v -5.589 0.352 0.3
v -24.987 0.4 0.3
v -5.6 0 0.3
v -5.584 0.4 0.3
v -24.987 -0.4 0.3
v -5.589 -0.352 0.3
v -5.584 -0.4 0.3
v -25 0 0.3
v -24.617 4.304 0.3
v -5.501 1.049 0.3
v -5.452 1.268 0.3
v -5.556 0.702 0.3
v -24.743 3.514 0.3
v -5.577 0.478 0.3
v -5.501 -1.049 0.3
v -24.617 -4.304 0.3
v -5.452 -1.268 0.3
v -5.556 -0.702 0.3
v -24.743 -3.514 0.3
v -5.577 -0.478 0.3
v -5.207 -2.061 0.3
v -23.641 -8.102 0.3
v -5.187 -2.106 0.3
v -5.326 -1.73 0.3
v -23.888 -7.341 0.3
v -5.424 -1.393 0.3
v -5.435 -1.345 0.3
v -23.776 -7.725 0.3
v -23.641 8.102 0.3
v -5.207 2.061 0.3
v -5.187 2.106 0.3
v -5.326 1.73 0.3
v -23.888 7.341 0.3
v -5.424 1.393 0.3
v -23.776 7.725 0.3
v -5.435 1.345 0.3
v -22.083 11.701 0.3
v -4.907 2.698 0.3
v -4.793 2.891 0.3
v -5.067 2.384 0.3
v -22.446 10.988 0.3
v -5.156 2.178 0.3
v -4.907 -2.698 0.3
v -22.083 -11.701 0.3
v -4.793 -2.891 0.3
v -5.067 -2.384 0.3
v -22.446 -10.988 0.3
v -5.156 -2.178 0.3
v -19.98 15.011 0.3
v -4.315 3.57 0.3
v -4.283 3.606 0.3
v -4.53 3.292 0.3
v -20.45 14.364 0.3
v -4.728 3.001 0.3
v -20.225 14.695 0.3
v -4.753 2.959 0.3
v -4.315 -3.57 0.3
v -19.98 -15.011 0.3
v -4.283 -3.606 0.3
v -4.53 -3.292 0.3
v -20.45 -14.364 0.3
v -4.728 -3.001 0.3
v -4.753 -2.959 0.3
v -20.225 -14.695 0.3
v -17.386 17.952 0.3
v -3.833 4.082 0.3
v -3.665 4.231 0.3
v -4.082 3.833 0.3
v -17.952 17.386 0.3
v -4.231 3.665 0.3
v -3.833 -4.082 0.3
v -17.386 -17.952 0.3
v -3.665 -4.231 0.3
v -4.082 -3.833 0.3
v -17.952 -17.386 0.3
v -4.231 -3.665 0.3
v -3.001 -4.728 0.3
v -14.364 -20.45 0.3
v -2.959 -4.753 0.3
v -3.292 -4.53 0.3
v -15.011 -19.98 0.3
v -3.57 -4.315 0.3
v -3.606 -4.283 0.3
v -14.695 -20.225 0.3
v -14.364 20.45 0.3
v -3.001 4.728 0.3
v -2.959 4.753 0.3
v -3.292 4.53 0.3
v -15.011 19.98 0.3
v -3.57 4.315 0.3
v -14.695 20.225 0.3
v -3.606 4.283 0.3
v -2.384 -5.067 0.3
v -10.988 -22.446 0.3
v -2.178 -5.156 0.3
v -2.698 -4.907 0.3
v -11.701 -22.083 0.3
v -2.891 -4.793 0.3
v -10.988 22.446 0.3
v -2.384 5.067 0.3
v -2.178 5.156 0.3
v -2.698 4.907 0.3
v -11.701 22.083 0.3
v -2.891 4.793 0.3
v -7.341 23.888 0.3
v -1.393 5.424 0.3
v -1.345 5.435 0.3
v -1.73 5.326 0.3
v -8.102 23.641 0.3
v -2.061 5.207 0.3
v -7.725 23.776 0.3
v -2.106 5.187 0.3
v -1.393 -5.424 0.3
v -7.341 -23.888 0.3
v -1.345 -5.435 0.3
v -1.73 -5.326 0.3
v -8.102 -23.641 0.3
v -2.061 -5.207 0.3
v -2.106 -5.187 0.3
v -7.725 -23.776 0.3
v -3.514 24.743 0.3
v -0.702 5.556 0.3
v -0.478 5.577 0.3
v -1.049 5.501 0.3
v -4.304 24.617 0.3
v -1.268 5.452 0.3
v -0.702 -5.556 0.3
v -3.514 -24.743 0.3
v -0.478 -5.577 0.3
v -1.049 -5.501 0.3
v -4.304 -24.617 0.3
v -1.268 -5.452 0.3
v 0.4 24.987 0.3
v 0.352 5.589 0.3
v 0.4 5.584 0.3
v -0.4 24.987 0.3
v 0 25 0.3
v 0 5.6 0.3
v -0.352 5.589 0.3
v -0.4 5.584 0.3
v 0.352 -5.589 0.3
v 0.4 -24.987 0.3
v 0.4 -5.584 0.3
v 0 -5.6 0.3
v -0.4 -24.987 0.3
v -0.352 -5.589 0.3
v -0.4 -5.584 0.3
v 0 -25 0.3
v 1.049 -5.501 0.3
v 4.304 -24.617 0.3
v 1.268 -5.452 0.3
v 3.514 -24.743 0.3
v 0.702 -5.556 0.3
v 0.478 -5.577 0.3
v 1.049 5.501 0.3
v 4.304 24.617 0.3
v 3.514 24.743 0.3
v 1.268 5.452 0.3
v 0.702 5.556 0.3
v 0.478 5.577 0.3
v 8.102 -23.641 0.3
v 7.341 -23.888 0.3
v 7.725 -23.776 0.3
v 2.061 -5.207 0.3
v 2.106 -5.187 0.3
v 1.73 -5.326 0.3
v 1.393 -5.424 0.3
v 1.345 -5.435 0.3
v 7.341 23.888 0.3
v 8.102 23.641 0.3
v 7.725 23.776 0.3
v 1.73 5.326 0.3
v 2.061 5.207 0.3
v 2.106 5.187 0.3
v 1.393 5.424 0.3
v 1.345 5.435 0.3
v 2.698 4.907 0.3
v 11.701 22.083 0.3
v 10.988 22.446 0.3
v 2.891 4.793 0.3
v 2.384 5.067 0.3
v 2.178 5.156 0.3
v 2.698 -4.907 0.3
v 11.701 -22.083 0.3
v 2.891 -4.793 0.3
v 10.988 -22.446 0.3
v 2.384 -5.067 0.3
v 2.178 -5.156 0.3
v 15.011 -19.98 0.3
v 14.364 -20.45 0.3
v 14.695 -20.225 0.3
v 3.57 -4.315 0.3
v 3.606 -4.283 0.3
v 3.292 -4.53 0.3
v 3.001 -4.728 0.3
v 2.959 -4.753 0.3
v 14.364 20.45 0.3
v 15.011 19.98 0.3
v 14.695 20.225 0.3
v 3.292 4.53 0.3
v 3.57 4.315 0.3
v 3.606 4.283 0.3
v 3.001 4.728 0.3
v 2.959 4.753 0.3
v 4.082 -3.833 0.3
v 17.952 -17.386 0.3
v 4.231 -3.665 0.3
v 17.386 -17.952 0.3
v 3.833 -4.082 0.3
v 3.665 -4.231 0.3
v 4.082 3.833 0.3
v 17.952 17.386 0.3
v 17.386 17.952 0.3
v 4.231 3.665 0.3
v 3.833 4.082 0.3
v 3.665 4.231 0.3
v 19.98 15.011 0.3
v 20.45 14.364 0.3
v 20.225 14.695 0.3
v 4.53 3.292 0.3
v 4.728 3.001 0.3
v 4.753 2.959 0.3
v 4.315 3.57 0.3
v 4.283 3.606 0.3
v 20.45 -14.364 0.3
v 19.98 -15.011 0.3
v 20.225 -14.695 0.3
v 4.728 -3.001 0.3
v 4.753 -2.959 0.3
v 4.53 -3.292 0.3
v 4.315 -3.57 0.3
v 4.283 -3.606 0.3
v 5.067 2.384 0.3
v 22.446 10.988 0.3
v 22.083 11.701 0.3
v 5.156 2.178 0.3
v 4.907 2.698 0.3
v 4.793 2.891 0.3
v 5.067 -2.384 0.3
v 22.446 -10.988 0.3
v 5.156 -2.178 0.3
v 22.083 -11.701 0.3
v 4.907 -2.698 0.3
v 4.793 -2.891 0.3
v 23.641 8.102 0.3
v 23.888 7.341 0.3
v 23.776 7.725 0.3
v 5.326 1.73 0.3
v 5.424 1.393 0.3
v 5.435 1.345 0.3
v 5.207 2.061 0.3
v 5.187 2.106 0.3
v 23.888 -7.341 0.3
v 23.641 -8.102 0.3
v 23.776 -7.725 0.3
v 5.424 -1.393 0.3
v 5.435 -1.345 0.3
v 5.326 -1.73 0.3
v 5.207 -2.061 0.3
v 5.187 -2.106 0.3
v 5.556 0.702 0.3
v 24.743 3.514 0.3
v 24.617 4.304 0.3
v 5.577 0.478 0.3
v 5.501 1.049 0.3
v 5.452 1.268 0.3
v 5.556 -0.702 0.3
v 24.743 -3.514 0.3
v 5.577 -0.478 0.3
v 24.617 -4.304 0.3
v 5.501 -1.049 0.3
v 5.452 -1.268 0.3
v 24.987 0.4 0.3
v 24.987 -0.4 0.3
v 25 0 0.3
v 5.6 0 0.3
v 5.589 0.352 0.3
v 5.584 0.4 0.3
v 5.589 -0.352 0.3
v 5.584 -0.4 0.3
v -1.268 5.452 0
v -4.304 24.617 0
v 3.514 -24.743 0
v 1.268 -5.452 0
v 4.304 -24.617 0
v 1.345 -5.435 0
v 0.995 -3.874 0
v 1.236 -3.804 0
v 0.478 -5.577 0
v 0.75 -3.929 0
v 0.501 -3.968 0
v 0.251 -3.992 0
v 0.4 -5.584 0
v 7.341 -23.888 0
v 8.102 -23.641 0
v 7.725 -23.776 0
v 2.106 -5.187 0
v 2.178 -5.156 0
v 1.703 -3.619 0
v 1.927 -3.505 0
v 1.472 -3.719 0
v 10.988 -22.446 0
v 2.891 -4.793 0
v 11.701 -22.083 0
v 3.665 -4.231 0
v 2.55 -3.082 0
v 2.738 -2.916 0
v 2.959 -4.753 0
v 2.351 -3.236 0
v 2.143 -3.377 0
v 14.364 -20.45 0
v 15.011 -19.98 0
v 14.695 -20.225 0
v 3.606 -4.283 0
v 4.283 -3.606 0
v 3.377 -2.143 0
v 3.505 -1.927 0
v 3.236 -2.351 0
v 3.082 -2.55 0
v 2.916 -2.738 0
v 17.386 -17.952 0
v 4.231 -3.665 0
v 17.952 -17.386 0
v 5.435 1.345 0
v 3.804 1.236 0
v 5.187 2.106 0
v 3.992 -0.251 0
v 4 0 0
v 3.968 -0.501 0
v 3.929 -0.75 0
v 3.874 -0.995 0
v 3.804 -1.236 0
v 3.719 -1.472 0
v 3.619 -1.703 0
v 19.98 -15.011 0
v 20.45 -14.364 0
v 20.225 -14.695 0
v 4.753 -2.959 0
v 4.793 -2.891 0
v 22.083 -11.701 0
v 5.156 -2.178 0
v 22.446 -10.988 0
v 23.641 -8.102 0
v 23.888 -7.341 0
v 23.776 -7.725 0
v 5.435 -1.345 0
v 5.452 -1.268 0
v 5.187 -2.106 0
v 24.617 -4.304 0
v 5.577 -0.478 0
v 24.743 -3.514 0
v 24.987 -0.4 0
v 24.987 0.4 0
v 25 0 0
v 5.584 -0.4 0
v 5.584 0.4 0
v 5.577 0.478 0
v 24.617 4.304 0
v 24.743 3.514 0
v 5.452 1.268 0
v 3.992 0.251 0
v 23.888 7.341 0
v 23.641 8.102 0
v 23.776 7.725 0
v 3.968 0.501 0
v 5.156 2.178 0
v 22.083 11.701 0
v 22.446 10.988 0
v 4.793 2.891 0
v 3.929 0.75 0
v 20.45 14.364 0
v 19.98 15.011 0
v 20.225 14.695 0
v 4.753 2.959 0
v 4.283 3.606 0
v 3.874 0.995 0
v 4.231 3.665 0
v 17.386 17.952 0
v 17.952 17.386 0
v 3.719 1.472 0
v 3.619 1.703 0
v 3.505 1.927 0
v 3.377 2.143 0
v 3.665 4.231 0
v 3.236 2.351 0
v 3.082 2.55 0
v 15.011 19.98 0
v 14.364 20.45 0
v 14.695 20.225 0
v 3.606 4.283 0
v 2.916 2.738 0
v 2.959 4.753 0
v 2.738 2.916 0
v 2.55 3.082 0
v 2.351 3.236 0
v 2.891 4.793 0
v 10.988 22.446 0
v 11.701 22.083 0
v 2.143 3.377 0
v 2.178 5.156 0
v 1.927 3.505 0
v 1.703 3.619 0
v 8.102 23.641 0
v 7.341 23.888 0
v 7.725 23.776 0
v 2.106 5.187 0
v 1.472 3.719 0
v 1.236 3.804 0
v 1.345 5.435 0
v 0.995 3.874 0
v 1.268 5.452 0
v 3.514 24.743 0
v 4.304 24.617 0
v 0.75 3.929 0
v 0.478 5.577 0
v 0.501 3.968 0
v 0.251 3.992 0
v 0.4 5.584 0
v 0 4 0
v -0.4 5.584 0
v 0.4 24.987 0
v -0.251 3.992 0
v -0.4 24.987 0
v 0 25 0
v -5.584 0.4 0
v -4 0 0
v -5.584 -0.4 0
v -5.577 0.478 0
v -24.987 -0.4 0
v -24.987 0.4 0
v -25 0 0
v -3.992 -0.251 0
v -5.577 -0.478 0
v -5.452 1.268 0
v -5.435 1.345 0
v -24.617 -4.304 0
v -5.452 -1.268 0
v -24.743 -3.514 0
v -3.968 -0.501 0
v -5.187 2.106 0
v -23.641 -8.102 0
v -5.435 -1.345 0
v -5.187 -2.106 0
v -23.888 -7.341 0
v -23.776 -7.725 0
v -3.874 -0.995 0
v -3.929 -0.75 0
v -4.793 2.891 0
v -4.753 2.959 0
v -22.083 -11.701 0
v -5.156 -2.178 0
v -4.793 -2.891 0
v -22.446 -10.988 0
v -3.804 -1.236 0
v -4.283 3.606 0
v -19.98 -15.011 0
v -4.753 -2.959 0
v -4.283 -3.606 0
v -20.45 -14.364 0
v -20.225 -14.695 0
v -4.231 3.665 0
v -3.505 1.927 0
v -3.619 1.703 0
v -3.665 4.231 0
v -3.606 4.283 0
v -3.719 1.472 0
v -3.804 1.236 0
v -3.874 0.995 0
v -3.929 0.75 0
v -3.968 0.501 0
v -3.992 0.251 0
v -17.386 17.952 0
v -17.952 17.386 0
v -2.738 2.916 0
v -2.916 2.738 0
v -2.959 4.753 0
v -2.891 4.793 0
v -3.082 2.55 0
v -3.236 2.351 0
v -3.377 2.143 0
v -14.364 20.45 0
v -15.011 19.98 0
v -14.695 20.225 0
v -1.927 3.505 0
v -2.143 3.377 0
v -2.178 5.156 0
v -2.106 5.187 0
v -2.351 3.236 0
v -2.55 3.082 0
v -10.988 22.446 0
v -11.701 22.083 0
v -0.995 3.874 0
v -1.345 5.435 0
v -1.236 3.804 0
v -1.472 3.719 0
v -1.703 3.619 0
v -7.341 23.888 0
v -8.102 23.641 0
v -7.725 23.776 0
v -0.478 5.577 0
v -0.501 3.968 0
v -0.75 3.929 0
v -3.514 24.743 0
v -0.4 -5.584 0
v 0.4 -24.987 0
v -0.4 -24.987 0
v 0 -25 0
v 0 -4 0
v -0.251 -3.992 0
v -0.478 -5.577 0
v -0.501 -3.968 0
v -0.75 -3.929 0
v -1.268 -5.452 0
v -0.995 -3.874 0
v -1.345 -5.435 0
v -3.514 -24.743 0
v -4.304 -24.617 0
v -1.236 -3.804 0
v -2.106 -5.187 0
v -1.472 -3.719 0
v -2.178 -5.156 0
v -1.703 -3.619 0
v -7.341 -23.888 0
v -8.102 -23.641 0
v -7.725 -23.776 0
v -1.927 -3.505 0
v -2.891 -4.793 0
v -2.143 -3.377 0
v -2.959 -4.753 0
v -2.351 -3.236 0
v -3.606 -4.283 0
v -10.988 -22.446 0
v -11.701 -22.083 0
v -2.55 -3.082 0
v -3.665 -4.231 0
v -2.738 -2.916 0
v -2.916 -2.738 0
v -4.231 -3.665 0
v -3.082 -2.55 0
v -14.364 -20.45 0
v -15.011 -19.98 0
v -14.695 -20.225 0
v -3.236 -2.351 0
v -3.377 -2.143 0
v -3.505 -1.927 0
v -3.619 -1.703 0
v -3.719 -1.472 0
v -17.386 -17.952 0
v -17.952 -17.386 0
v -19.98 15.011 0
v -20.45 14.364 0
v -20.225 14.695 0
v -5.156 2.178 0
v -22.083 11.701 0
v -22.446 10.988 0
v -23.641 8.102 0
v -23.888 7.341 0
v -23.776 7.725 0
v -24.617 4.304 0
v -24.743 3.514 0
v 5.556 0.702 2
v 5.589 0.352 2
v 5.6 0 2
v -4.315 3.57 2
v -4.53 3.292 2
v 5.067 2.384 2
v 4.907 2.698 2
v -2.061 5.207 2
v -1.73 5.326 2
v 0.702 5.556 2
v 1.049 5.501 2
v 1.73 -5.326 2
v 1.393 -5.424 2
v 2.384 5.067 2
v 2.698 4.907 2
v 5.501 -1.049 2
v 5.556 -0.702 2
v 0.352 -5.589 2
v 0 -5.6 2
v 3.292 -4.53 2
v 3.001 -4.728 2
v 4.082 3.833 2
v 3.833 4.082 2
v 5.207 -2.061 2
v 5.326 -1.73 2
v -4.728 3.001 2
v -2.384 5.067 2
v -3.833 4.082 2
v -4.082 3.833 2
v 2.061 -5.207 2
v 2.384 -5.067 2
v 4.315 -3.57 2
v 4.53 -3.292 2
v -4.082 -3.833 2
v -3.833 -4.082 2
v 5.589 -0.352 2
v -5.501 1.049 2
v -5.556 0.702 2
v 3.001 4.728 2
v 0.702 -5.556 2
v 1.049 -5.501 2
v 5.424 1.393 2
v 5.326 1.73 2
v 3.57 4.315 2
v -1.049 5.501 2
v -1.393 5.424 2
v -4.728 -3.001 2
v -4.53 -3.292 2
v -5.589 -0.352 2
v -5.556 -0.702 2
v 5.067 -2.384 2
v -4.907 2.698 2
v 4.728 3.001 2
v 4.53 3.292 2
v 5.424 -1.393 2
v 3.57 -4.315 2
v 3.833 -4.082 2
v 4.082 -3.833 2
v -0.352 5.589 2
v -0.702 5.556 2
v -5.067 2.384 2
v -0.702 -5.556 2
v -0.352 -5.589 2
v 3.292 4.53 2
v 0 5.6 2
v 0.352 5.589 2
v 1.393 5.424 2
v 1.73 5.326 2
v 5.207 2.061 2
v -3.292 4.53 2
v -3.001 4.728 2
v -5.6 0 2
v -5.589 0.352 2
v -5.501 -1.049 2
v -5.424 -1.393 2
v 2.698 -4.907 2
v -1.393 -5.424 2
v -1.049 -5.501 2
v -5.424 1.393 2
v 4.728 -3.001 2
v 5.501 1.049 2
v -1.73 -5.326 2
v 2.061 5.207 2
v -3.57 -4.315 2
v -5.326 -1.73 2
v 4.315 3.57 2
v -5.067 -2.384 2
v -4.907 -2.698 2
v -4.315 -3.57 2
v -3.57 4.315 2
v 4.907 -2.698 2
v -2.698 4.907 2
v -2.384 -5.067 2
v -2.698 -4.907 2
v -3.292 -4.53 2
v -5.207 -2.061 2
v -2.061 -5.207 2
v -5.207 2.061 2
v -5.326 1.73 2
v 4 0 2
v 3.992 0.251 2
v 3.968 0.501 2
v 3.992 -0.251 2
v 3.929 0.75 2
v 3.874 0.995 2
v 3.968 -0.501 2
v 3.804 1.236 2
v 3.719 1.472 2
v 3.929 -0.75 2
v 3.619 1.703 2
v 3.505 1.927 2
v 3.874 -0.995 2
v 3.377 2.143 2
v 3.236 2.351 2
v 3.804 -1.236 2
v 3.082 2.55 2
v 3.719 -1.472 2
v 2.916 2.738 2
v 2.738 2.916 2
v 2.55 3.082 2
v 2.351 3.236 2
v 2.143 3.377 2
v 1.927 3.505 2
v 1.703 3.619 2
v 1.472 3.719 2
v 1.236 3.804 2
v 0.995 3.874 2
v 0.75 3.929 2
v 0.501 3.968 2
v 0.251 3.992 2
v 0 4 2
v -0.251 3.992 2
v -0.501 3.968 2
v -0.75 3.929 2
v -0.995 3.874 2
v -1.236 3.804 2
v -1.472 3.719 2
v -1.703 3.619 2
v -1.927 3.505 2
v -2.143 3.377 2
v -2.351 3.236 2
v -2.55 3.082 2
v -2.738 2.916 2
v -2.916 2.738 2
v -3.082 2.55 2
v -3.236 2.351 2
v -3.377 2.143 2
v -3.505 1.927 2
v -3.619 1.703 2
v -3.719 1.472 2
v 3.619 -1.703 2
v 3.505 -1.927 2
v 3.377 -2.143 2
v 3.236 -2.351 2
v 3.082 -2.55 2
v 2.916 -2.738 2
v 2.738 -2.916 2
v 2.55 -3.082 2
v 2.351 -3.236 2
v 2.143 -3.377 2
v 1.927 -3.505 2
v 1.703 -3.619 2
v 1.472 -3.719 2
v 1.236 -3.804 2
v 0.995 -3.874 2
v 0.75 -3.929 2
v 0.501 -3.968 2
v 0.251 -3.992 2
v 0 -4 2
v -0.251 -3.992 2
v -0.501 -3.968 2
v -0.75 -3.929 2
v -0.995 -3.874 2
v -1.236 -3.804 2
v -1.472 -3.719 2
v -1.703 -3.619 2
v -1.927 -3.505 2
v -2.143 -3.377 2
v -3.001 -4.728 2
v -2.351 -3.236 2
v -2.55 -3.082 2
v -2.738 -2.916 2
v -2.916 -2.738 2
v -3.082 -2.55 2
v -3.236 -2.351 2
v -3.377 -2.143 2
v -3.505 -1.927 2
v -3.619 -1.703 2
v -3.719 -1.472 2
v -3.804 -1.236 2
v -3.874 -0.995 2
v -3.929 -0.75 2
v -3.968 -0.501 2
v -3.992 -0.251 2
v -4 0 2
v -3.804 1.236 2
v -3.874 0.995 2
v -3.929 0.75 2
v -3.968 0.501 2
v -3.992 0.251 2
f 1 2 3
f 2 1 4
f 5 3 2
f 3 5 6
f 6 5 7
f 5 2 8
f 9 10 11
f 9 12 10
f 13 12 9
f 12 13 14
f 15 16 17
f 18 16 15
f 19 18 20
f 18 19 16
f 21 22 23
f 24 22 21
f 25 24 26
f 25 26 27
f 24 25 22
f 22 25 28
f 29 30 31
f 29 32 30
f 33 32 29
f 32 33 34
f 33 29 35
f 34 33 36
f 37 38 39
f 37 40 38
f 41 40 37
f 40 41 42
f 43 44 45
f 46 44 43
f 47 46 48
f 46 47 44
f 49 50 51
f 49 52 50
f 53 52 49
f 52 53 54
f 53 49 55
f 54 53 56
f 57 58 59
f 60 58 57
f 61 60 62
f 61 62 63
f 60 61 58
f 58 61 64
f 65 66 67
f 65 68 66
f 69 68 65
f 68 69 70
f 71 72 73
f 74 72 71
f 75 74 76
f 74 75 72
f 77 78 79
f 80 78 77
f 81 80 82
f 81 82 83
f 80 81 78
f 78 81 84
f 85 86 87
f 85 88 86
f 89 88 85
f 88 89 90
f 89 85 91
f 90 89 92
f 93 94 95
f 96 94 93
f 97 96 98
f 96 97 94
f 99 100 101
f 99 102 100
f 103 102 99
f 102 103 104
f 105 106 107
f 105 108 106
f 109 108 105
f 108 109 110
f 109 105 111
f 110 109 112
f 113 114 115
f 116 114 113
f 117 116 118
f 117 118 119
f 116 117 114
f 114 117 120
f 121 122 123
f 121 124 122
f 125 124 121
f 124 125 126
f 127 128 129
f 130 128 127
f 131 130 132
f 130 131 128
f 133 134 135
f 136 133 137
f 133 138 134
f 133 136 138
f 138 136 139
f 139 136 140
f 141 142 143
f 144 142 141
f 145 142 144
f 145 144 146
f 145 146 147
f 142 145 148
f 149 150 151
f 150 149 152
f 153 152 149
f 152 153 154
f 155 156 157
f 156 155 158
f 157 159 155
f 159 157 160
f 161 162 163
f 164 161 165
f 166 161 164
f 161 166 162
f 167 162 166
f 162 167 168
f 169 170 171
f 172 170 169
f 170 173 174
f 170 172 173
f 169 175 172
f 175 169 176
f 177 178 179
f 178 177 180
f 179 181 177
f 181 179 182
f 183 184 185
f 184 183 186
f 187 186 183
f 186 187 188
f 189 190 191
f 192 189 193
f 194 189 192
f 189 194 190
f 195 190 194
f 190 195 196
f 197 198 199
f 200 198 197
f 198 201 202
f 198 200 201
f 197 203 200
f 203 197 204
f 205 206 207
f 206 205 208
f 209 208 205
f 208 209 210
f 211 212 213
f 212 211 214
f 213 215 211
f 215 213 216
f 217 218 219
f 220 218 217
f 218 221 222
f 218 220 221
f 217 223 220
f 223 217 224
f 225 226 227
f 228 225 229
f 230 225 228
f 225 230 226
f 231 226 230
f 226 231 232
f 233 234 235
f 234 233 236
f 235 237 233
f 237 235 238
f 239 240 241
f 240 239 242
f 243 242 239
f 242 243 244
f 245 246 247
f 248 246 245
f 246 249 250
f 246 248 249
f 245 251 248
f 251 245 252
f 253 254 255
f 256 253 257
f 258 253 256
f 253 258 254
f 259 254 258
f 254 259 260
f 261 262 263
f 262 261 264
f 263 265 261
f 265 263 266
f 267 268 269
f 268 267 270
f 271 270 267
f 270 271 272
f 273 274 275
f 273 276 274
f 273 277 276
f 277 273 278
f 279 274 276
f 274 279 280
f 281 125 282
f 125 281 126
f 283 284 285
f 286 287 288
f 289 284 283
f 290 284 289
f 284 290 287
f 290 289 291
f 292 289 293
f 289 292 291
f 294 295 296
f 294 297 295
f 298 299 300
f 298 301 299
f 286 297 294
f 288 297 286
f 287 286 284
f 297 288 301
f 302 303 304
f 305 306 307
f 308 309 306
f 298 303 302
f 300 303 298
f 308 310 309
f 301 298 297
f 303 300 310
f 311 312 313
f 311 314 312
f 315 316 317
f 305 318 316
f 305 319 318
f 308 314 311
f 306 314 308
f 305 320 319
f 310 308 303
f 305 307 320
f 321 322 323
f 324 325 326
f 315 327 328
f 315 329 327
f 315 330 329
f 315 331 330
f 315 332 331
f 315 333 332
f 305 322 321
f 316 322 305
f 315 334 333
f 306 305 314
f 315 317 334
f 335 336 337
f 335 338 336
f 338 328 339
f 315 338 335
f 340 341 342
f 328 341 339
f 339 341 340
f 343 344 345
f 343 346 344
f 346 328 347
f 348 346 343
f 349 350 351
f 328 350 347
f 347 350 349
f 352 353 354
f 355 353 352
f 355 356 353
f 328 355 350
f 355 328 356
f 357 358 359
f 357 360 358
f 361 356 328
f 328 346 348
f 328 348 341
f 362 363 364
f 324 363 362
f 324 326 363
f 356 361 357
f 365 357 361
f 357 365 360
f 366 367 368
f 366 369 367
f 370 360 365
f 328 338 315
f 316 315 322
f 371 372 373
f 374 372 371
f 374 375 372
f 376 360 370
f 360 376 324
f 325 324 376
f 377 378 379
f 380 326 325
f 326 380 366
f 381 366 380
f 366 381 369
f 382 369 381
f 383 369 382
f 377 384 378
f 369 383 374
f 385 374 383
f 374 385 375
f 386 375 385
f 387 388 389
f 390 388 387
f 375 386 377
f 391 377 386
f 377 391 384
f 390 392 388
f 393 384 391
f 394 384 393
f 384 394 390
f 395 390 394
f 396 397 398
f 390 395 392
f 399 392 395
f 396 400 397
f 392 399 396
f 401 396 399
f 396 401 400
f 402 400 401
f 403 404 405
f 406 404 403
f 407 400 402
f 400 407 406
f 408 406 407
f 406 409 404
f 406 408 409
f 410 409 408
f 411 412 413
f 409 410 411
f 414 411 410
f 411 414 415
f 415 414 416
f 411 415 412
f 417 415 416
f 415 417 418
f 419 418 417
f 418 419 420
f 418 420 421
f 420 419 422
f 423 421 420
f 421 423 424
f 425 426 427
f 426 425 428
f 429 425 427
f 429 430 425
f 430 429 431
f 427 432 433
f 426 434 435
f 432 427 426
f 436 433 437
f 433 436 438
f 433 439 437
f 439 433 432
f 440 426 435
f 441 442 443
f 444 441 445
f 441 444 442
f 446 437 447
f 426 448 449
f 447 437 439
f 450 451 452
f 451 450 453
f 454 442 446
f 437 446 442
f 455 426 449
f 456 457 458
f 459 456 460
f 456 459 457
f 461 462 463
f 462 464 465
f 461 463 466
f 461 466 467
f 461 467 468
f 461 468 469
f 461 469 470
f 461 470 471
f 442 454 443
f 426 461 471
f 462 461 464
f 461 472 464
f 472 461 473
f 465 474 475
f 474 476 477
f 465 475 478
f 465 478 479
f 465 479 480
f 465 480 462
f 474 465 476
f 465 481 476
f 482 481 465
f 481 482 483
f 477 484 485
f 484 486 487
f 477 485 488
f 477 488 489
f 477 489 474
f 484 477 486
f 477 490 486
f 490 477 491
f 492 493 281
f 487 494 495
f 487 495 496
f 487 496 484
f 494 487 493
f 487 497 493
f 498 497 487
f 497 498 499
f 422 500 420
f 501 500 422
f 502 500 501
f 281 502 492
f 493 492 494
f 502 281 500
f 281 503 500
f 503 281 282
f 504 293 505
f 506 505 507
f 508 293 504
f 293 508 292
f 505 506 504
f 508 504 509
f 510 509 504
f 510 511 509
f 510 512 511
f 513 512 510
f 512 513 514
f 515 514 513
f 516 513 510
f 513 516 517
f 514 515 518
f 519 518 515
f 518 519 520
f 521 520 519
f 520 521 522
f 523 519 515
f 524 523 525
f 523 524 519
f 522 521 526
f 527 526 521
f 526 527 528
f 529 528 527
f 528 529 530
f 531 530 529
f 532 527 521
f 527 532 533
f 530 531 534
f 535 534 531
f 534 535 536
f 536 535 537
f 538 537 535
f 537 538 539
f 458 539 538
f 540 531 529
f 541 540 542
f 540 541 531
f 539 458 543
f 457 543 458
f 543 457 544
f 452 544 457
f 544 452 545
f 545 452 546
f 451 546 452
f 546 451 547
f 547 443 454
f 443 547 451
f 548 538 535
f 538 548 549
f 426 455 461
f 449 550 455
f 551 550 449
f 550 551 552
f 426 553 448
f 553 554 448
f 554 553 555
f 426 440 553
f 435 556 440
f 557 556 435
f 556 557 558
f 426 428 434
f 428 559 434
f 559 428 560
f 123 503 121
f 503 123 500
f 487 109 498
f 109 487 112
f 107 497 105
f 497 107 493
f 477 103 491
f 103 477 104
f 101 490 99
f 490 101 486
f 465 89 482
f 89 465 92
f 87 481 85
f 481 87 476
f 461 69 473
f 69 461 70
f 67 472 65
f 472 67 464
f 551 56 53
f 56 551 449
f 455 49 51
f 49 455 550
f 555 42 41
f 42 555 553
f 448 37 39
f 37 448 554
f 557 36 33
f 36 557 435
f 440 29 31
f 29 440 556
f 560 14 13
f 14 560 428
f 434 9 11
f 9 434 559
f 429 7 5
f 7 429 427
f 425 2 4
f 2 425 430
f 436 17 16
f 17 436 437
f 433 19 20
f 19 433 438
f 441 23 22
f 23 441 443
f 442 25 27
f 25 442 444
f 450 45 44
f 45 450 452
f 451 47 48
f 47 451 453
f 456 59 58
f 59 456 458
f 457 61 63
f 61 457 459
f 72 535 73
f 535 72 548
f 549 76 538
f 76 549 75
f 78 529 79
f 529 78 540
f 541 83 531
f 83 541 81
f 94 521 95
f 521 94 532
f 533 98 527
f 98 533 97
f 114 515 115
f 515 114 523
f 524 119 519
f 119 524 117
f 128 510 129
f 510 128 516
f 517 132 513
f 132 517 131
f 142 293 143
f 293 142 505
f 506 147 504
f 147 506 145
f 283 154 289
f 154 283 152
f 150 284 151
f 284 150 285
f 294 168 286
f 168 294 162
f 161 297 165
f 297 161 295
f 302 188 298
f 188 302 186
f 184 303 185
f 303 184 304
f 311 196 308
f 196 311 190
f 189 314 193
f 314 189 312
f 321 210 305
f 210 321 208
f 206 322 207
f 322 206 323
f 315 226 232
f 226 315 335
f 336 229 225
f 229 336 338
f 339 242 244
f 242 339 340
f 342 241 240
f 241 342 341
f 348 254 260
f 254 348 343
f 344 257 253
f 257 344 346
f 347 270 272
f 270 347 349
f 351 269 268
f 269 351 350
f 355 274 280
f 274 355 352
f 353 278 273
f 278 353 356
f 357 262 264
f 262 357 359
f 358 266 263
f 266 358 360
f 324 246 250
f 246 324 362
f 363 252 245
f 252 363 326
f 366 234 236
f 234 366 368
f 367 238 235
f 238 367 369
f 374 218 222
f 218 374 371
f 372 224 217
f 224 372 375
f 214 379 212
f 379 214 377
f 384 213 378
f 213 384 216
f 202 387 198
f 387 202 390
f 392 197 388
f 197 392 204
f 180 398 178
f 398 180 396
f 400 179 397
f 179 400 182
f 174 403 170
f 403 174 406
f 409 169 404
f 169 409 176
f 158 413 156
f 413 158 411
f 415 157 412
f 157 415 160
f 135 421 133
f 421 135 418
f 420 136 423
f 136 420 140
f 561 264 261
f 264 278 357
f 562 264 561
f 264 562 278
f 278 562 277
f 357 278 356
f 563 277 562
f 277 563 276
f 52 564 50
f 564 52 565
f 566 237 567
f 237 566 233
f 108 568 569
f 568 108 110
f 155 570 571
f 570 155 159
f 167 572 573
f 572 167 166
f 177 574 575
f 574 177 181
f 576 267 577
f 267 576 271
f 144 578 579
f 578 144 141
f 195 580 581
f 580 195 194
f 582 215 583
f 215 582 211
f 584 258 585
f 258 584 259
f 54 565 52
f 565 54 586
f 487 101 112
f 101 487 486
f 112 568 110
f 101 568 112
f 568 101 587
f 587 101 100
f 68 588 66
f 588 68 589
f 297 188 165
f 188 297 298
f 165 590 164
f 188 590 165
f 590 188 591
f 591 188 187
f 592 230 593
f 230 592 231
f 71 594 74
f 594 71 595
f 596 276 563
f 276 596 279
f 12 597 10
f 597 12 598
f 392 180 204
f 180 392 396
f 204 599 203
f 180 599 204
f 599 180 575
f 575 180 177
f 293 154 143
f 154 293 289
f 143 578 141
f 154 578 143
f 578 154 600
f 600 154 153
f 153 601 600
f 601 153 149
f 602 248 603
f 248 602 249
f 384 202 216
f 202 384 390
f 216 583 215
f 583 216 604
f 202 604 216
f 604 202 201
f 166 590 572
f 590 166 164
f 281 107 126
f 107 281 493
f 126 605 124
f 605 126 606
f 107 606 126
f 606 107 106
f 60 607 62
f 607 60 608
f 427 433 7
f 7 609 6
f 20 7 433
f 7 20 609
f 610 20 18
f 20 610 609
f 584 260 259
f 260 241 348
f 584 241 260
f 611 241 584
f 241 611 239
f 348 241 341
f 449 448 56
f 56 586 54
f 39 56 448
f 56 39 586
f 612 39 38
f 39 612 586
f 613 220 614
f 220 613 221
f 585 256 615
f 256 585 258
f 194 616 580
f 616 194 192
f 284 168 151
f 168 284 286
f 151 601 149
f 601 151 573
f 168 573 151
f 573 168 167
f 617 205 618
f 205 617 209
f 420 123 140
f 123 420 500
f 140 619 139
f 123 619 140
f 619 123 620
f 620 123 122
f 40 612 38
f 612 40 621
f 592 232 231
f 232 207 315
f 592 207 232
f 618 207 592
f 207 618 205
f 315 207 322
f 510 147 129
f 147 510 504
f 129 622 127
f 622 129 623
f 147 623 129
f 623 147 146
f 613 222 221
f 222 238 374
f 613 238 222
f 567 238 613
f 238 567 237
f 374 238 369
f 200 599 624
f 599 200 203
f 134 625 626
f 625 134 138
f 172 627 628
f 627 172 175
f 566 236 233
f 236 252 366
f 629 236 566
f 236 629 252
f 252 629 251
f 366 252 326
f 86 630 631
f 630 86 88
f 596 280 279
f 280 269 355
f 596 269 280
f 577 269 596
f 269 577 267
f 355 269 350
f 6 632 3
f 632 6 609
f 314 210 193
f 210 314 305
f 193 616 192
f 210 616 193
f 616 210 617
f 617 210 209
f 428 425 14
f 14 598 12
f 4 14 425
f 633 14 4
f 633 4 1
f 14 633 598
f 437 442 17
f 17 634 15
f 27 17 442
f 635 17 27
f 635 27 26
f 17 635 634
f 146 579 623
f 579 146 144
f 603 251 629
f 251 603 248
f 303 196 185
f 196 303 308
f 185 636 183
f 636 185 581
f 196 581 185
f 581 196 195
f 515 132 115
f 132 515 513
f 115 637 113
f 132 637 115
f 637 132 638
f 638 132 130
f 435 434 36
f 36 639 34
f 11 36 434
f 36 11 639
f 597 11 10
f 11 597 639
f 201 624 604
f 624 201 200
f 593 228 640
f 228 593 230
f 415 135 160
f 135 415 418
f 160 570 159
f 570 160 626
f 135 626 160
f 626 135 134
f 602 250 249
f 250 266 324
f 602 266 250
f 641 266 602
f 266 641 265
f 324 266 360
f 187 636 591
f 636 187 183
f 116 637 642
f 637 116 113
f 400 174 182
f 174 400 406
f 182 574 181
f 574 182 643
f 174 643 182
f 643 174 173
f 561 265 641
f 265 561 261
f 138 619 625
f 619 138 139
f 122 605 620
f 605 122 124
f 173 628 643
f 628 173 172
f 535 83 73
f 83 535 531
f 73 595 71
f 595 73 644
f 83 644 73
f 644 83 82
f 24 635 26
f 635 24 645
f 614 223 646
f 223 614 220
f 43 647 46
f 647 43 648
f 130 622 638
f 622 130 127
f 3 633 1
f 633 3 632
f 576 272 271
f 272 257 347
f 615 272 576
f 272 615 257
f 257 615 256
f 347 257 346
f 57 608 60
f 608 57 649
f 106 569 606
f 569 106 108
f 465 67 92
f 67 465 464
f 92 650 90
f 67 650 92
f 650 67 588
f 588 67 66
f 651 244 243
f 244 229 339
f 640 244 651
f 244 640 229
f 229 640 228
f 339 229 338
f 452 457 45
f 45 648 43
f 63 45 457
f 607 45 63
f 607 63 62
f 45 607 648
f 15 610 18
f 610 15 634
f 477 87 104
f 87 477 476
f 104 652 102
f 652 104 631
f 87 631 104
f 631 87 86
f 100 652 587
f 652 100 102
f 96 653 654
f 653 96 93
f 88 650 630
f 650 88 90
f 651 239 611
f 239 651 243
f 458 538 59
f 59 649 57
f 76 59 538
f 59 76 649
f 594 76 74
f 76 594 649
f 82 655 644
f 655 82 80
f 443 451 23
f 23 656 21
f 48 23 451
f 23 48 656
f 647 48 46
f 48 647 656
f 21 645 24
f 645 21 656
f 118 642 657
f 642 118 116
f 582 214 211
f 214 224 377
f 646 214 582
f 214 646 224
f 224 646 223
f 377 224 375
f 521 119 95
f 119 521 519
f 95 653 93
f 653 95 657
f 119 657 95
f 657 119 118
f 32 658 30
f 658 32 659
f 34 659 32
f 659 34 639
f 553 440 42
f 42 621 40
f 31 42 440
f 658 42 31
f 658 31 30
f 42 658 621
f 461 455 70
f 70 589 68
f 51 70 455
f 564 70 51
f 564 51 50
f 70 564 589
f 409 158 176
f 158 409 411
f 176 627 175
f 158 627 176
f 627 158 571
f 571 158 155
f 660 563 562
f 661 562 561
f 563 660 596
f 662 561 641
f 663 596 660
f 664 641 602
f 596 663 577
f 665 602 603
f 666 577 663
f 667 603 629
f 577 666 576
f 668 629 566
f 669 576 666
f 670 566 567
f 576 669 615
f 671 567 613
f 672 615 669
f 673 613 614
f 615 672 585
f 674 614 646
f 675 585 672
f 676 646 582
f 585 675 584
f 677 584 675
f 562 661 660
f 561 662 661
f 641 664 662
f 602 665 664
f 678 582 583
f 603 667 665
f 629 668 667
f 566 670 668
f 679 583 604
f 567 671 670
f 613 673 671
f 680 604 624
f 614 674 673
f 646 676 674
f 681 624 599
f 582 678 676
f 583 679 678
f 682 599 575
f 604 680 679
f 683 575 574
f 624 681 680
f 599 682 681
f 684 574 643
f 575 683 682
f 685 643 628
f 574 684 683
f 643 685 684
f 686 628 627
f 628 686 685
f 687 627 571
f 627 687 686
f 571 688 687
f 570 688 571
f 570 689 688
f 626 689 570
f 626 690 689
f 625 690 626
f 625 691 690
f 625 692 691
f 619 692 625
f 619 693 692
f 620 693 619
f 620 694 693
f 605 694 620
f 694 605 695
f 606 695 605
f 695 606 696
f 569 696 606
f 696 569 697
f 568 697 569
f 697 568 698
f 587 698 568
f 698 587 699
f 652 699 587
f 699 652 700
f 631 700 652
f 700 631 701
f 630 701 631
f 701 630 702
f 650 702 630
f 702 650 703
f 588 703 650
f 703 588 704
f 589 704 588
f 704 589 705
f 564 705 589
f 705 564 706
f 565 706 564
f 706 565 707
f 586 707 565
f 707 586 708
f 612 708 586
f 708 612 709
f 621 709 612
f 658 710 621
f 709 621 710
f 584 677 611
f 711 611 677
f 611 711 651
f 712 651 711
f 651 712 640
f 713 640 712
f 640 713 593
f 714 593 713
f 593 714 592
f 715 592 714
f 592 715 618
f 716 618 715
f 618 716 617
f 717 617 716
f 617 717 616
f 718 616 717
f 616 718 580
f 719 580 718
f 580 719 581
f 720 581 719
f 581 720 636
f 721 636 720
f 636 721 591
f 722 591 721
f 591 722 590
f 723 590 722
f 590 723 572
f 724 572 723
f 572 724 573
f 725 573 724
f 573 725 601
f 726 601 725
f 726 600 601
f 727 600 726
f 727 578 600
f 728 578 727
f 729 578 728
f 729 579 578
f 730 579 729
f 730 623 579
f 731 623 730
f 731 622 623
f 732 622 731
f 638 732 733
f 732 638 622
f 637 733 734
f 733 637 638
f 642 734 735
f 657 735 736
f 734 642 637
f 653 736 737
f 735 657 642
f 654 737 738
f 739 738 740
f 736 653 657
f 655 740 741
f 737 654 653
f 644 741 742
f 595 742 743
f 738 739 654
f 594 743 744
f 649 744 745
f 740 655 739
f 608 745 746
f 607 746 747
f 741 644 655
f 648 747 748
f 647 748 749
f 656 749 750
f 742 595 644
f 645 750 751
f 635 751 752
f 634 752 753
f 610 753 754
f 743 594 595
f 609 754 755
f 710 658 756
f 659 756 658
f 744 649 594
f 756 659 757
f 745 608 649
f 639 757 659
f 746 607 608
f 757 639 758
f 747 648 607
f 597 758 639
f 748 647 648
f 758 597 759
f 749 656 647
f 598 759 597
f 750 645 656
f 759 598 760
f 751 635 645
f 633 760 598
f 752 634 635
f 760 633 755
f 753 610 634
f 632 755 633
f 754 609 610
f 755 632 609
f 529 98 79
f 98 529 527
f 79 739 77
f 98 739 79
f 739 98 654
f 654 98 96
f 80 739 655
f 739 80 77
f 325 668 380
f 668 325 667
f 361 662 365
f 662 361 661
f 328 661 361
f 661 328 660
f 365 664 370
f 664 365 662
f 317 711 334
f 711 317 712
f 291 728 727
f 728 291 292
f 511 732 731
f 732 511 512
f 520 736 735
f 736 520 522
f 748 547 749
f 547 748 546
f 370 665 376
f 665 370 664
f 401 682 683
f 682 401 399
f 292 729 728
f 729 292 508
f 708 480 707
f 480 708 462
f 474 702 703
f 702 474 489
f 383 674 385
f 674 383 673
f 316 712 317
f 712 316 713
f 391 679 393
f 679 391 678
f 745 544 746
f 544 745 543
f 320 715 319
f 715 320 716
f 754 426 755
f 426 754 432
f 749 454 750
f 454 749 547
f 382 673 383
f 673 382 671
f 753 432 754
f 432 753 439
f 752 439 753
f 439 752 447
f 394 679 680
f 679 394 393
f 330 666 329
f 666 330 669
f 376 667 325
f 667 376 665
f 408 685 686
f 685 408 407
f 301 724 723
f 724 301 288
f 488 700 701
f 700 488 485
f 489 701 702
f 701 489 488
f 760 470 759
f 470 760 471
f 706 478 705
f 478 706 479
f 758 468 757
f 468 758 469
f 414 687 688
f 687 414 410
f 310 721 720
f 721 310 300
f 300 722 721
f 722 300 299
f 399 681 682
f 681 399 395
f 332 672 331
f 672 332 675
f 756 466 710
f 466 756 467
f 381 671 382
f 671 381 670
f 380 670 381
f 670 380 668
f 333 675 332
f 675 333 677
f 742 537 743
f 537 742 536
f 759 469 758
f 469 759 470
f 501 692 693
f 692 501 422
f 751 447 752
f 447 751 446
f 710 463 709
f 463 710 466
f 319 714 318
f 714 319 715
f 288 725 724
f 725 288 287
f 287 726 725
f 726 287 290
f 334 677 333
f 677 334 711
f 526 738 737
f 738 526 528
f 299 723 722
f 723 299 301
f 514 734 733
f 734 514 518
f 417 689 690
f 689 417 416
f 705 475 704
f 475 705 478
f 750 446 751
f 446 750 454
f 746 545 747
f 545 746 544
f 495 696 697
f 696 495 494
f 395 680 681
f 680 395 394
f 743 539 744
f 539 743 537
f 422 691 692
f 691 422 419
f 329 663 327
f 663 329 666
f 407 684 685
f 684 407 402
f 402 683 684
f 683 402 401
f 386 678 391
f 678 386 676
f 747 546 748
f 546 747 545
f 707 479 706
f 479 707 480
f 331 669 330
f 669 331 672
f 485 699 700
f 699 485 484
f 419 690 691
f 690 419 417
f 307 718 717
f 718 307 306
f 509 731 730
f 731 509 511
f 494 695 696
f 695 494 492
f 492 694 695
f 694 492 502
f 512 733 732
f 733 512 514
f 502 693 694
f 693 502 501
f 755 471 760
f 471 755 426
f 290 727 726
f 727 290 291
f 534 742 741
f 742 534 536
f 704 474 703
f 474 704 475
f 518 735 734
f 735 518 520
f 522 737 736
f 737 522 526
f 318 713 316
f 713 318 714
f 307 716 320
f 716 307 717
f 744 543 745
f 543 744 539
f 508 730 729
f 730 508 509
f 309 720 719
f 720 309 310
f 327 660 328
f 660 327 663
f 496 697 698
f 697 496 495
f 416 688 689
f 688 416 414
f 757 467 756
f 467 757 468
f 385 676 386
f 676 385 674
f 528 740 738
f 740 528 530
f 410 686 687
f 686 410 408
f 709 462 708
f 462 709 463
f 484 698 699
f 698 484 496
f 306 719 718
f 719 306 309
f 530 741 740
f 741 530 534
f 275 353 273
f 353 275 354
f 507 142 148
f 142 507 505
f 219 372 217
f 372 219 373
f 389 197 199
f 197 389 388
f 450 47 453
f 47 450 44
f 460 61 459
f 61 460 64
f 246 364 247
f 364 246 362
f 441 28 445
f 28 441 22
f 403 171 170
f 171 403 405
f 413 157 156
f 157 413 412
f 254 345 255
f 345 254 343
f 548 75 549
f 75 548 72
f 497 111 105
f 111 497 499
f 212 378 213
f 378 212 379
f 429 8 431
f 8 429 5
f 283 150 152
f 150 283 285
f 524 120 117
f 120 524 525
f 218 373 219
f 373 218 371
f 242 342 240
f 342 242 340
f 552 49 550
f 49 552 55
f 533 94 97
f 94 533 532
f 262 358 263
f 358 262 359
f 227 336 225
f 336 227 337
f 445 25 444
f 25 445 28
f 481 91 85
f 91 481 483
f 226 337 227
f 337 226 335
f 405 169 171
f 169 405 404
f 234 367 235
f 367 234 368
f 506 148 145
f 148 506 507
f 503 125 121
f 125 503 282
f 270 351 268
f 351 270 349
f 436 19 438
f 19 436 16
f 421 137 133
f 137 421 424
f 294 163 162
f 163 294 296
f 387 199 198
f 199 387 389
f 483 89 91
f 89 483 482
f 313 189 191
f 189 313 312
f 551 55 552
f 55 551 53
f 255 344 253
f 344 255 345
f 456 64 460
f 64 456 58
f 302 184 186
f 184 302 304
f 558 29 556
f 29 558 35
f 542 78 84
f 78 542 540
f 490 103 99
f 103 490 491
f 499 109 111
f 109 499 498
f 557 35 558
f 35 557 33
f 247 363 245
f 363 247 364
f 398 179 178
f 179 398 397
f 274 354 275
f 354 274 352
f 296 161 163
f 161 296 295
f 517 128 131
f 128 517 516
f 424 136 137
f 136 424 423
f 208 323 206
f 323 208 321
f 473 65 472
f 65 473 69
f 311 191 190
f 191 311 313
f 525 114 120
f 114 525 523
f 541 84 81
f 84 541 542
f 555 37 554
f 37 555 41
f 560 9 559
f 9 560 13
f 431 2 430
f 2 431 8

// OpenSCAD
//bottle brush creator - v2.7.4
//Mark G. Peeters August 16, 2015 CC BY-SA
//inspired by drooloops flowers
//more details are posted here:
//https://www.youmagine.com/designs/bottle-brush-customizable/
//http://www.thingiverse.com/thing:980106
// preview[view:west, tilt:top diagonal]


/* [choose parts to print] */
//print what?
print=0;//[0:bristles_layer,1:centerpost]
//for keyed center only (see post settings tab) - number stagger layers used
staggers=2;//[2:two stagger parts,3:three stagger parts]
//which stagger to print, generate one at a time, NOTE!- there will be a notch made in the center support corresponding the the part number. So 1st part has one notch, 2nd part has 2 notches, etc
stag_num=1;//[1:1st stagger part,2:2nd stagger part,3:3rd stagger part]

/* [brush settings] */
//number of bristle per layer
b_number=40; //[1:50]
//outer radius of brush bristle
brush_od=25;//25
//center support radius outer OD
center_support=5.6;//5.6
//center support radius of hole ID
center_hole=4;//4

/* [central post settings] */
//center keyed? this make center a D hole
center_key=0;//[0:no,1:yes]
//decimal percent key depth from center zero to one
center_key_depth=0.6;//0.6
//length of central post
post_z=16;//16
//mount hole radius
post_mount_hole=2.2;//2.2
//fit tolerance, radius value
tol=0.2;//0.2

/* [advanced settings] */
//bristle width - flatness
b_width=0.8;//0.8
//bristle height - thickness
b_height=0.3;//0.3
//bristle layer spacing on shaft - how far in between bristles (NOTE: minimum setting is equal to bristle height
b_space_z=2;//2
//bristle rise above print bed, zero for flat, 0.3 or more for drooloop
b_rize=0.0;//0.0
//central post transition at tip
post_tip_z=0.7;//0.7
//central post mm to shrink at tip
post_tip_shrink=0.7;//0.7

/* [Hidden] */

//key rotation
key_rot=(360/b_number)/staggers;
//key_rot=40;

//handle parameters
//brush handle or mount hole (not used in 2.7)
handle=0;//[0:handle,1:mount hole]
handle_length=50;//length of handle if used
handle_radius=5;//radius for handle if used make smaller that hole
$fn=100;

if (print==0){//print bristle layer
   
    if (center_key==1){
   difference(){//put layer indicator on bristle
       union(){
  layer(b_number,b_width,brush_od,b_height,center_hole,center_support,b_space_z,b_rize);  
    holekey(center_hole,key_rot*stag_num,b_space_z,center_support,center_key_depth);
       }//end union
    translate([0,0,b_space_z-0.2])bristles_ind(stag_num,b_width,brush_od,b_height);
   }//end diff bristle indicator
  }
  
  if (center_key==0){
  layer(b_number,b_width,brush_od,b_height,center_hole,center_support,b_space_z,b_rize);  
  }
}
//end print choices



if (print==1){//print center post
    
if (handle==1){//add handle    
post(center_hole,post_z,center_key_depth,tol,post_tip_z,post_tip_shrink);
    translate([0,0,post_z])cylinder(r=handle_radius,h=handle_length);
}//end add handle          
  
   if (handle==0){//make hole    
   rotate([180,0,0])difference(){
post(center_hole,post_z,center_key_depth,tol,post_tip_z,post_tip_shrink);
    translate([0,0,-(post_tip_z+1)])cylinder(r=post_mount_hole,h=post_z+post_tip_z+5,$fn=100);
   }//end diff
}//end add hole  

//add cap
rotate([180,0,0])difference(){
translate([center_hole*3,0,post_z])cylinder(r=center_hole+1,h=1);
translate([center_hole*3,0,-(post_tip_z+1)])cylinder(r=post_mount_hole,h=post_z+post_tip_z+5,$fn=100);
   }//end diff
   
   
}
//end print choices



//make a layer-------------------------------------------
module layer(b_number,b_width,brush_od,b_height,center_hole,center_support,b_space_z,b_rize){
difference(){
// make the too long bristle shape
difference(){
    union(){
        translate([0,0,b_rize])bristles(b_number,b_width,brush_od+2,b_height);
        ring(center_hole,center_support,b_space_z);
    }//end union
    translate([0,0,-1])cylinder(r=center_hole,h=b_space_z+2);
  };//end diff
//trimm the bristles
  translate([0,0,-1])ring(brush_od,sqrt(brush_od*brush_od+(b_width*b_width)/4)+4,b_space_z+2);
  }//end layer diff
  
  
  }
  //end mod layer
  
  
//add key?-------------------
  module holekey(center_hole,key_rot,b_space_z,center_support,center_key_depth){
if (center_key==1){
difference(){
    translate((center_hole*(0.5+center_key_depth))*[sin(key_rot), -cos(key_rot),0])
    translate([0,0,b_space_z/2])
    rotate([0,0,key_rot])
    cube([center_support*2,center_hole,b_space_z],center=true);
    
    translate([0,0,-1])ring(center_support,center_support*2,b_space_z+2);
            }//end diff
            }//-----end add key------------------
        }
//end mod holekey---------------------------
  
     
//!bristles(b_number,b_width,brush_od,b_height);
module bristles(b_number,b_width,brush_od,b_height){
    for (i=[1:b_number]) {//single petal layer
			rotate ([0,0,i*360/b_number])
			color ("blue")
    translate([-b_width/2,0,0])cube([b_width,brush_od,b_height]);
		}//end i single petal layer
    };//end modle bristles
module ring(ring_inside,ring_outside,ring_height){
   difference(){
        cylinder(r=ring_outside,h=ring_height);
    translate([0,0,-1])cylinder(r=ring_inside,h=ring_height+2);
   }//end diff    
}//end mod ring

module bristles_ind(b_number,b_width,brush_od,b_height){
    for (i=[1:b_number]) {//single petal layer
			rotate ([0,0,i*30])
			color ("blue")
    translate([-b_width/2,0,0])cube([b_width,brush_od+2,b_height]);
		}//end i single petal layer
    };//end modle bristles




//!post(center_hole,tol);
module post(center_hole,post_z,center_key_depth,tol,post_tip_z,post_tip_shrink){
//main 
    keyed_cylinder(center_hole,post_z,center_key,center_key_depth,tol);
//tip for easy assembly
    hull(){
    keyed_cylinder(center_hole,0.01,center_key,center_key_depth,tol);
    translate([0,0,-post_tip_z])
    //scale([.9,.9,1])
    keyed_cylinder(center_hole-post_tip_shrink,0.01,center_key,center_key_depth,tol);
    }//end hull
//collar
    translate([0,0,post_z])cylinder(r=center_hole+1,h=1);   
};//end mod post


//!keyed_cylinder(center_hole,post_z,center_key,center_key_depth,tol);
module keyed_cylinder(od,tall,center_key,center_key_depth,tol){
    if (center_key==1){
difference(){
    cylinder(r=od-tol,h=tall);
    translate([0,((od*(0.5+center_key_depth))-tol),0])
    translate([0,0,tall/2])
    cube([od*2,od,tall+2],center=true);
    }//end diff
}//end if keyed
if (center_key==0){
cylinder(r=od-tol,h=tall);
}//end if not keyed
}
//end module keyed_cylinder
